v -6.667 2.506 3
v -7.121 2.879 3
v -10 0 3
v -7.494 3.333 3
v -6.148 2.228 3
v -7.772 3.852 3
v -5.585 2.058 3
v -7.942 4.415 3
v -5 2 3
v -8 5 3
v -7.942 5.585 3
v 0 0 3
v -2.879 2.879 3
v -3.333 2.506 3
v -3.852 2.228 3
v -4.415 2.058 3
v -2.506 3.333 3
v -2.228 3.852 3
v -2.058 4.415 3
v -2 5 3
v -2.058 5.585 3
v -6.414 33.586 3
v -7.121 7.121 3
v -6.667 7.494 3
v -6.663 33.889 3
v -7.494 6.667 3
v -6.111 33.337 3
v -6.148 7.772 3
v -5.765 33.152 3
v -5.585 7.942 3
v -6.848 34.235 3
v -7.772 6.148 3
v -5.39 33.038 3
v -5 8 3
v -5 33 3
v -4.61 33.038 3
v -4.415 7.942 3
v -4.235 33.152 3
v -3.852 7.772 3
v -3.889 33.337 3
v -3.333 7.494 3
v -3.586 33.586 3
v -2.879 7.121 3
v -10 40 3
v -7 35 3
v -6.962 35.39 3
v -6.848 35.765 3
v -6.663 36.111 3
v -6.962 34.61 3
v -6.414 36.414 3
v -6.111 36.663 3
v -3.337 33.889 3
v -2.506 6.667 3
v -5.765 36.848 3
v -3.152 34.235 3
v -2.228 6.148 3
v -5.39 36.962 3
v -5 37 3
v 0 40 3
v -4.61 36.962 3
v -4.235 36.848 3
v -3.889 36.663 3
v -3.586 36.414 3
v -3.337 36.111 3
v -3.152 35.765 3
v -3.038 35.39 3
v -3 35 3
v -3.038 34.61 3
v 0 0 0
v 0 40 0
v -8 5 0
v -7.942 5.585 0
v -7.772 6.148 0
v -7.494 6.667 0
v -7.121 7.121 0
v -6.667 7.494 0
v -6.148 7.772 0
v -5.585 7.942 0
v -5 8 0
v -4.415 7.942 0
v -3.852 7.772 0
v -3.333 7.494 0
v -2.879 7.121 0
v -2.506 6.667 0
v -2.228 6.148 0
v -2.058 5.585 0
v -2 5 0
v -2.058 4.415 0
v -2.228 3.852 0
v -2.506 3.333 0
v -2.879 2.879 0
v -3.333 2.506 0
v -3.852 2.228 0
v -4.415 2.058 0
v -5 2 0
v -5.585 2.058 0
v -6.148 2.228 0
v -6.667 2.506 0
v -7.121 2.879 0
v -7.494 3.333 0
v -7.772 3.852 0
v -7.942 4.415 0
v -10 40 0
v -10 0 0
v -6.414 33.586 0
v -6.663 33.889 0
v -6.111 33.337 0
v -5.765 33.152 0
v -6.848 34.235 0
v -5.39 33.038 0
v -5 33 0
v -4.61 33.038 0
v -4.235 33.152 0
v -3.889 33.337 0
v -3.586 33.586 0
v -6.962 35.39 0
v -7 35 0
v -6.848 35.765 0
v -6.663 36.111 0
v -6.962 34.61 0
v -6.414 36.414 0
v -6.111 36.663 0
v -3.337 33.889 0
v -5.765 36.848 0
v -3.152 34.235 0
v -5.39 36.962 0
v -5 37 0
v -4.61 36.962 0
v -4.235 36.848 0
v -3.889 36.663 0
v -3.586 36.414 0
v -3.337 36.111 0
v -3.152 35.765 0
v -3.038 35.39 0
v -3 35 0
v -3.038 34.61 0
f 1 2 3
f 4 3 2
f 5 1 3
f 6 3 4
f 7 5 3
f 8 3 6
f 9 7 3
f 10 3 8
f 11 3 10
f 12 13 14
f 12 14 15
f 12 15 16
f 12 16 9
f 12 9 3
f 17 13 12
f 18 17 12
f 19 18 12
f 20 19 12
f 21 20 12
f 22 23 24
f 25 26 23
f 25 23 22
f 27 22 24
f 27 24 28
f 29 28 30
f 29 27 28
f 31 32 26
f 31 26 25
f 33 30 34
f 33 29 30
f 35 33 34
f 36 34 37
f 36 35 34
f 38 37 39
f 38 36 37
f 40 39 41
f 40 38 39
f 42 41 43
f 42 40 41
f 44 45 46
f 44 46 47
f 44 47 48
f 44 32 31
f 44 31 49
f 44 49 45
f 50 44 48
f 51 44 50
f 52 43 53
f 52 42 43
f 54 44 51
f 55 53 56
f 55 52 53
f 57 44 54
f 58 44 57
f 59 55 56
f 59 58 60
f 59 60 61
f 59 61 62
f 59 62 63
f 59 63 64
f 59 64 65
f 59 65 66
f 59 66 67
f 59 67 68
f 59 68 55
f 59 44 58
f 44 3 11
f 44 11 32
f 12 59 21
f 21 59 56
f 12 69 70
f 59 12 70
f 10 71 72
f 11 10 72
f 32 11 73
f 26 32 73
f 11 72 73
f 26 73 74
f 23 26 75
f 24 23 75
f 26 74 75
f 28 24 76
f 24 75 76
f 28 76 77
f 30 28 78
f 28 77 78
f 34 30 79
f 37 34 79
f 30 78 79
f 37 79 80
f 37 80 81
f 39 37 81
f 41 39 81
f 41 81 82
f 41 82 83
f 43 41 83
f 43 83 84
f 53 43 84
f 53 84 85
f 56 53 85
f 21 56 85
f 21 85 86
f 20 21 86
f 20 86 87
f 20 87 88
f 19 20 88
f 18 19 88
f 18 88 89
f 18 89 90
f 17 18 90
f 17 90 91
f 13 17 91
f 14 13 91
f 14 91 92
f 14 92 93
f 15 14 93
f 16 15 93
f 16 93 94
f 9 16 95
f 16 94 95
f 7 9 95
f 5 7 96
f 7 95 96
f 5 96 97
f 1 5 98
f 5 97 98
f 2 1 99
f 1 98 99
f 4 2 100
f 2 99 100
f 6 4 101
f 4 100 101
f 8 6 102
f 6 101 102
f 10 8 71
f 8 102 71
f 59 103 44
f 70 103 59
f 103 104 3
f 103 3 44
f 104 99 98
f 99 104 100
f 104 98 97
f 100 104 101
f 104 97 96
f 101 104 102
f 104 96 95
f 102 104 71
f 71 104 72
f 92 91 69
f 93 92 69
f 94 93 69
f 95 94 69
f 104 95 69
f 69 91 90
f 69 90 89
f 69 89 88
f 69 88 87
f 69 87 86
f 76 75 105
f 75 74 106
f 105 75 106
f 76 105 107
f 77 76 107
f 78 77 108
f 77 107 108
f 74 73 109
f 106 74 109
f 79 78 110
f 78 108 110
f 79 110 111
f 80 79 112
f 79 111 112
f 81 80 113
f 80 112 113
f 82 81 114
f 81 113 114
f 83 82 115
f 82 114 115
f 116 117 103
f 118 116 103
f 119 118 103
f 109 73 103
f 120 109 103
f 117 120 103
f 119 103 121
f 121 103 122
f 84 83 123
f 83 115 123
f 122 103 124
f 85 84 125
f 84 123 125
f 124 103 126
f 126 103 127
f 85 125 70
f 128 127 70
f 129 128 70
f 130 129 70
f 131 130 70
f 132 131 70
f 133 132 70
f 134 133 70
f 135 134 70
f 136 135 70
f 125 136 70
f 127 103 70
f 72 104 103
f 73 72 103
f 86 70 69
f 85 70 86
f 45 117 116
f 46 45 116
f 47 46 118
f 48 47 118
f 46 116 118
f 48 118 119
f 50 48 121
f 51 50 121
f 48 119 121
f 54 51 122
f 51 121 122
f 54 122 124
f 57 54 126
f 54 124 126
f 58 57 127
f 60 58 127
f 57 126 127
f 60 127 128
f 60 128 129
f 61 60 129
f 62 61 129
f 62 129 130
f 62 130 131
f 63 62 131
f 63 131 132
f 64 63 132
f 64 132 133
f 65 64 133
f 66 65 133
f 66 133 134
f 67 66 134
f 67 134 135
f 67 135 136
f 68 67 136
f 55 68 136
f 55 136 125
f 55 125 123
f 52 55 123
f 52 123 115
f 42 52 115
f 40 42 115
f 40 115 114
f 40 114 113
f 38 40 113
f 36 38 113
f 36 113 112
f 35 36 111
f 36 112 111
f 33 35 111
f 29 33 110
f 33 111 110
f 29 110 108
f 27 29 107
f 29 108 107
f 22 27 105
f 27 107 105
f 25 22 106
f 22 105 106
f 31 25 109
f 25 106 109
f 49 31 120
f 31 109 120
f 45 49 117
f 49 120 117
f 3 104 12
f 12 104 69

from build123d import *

# Parameters (mm, degrees)
F0_W     = 10
F0_H     = 40
F1_DEPTH = 3
F3_D     = 6
F4_D     = 4


with BuildPart() as f1:
    # F0 (on Top) → F1 (new body)
    with BuildSketch(Plane.XY):
        with Locations((-5, 20)):
            Rectangle(F0_W, F0_H)
    extrude(amount=F1_DEPTH)

    # F3 (through all)
    with Locations(Plane.XY.offset(3)):
        with Locations((-5, 5)):
            Hole(F3_D / 2)

    # F4 (through all)
    with Locations(Plane.XY.offset(3)):
        with Locations((-5, 35)):
            Hole(F4_D / 2)


solid = f1.part
